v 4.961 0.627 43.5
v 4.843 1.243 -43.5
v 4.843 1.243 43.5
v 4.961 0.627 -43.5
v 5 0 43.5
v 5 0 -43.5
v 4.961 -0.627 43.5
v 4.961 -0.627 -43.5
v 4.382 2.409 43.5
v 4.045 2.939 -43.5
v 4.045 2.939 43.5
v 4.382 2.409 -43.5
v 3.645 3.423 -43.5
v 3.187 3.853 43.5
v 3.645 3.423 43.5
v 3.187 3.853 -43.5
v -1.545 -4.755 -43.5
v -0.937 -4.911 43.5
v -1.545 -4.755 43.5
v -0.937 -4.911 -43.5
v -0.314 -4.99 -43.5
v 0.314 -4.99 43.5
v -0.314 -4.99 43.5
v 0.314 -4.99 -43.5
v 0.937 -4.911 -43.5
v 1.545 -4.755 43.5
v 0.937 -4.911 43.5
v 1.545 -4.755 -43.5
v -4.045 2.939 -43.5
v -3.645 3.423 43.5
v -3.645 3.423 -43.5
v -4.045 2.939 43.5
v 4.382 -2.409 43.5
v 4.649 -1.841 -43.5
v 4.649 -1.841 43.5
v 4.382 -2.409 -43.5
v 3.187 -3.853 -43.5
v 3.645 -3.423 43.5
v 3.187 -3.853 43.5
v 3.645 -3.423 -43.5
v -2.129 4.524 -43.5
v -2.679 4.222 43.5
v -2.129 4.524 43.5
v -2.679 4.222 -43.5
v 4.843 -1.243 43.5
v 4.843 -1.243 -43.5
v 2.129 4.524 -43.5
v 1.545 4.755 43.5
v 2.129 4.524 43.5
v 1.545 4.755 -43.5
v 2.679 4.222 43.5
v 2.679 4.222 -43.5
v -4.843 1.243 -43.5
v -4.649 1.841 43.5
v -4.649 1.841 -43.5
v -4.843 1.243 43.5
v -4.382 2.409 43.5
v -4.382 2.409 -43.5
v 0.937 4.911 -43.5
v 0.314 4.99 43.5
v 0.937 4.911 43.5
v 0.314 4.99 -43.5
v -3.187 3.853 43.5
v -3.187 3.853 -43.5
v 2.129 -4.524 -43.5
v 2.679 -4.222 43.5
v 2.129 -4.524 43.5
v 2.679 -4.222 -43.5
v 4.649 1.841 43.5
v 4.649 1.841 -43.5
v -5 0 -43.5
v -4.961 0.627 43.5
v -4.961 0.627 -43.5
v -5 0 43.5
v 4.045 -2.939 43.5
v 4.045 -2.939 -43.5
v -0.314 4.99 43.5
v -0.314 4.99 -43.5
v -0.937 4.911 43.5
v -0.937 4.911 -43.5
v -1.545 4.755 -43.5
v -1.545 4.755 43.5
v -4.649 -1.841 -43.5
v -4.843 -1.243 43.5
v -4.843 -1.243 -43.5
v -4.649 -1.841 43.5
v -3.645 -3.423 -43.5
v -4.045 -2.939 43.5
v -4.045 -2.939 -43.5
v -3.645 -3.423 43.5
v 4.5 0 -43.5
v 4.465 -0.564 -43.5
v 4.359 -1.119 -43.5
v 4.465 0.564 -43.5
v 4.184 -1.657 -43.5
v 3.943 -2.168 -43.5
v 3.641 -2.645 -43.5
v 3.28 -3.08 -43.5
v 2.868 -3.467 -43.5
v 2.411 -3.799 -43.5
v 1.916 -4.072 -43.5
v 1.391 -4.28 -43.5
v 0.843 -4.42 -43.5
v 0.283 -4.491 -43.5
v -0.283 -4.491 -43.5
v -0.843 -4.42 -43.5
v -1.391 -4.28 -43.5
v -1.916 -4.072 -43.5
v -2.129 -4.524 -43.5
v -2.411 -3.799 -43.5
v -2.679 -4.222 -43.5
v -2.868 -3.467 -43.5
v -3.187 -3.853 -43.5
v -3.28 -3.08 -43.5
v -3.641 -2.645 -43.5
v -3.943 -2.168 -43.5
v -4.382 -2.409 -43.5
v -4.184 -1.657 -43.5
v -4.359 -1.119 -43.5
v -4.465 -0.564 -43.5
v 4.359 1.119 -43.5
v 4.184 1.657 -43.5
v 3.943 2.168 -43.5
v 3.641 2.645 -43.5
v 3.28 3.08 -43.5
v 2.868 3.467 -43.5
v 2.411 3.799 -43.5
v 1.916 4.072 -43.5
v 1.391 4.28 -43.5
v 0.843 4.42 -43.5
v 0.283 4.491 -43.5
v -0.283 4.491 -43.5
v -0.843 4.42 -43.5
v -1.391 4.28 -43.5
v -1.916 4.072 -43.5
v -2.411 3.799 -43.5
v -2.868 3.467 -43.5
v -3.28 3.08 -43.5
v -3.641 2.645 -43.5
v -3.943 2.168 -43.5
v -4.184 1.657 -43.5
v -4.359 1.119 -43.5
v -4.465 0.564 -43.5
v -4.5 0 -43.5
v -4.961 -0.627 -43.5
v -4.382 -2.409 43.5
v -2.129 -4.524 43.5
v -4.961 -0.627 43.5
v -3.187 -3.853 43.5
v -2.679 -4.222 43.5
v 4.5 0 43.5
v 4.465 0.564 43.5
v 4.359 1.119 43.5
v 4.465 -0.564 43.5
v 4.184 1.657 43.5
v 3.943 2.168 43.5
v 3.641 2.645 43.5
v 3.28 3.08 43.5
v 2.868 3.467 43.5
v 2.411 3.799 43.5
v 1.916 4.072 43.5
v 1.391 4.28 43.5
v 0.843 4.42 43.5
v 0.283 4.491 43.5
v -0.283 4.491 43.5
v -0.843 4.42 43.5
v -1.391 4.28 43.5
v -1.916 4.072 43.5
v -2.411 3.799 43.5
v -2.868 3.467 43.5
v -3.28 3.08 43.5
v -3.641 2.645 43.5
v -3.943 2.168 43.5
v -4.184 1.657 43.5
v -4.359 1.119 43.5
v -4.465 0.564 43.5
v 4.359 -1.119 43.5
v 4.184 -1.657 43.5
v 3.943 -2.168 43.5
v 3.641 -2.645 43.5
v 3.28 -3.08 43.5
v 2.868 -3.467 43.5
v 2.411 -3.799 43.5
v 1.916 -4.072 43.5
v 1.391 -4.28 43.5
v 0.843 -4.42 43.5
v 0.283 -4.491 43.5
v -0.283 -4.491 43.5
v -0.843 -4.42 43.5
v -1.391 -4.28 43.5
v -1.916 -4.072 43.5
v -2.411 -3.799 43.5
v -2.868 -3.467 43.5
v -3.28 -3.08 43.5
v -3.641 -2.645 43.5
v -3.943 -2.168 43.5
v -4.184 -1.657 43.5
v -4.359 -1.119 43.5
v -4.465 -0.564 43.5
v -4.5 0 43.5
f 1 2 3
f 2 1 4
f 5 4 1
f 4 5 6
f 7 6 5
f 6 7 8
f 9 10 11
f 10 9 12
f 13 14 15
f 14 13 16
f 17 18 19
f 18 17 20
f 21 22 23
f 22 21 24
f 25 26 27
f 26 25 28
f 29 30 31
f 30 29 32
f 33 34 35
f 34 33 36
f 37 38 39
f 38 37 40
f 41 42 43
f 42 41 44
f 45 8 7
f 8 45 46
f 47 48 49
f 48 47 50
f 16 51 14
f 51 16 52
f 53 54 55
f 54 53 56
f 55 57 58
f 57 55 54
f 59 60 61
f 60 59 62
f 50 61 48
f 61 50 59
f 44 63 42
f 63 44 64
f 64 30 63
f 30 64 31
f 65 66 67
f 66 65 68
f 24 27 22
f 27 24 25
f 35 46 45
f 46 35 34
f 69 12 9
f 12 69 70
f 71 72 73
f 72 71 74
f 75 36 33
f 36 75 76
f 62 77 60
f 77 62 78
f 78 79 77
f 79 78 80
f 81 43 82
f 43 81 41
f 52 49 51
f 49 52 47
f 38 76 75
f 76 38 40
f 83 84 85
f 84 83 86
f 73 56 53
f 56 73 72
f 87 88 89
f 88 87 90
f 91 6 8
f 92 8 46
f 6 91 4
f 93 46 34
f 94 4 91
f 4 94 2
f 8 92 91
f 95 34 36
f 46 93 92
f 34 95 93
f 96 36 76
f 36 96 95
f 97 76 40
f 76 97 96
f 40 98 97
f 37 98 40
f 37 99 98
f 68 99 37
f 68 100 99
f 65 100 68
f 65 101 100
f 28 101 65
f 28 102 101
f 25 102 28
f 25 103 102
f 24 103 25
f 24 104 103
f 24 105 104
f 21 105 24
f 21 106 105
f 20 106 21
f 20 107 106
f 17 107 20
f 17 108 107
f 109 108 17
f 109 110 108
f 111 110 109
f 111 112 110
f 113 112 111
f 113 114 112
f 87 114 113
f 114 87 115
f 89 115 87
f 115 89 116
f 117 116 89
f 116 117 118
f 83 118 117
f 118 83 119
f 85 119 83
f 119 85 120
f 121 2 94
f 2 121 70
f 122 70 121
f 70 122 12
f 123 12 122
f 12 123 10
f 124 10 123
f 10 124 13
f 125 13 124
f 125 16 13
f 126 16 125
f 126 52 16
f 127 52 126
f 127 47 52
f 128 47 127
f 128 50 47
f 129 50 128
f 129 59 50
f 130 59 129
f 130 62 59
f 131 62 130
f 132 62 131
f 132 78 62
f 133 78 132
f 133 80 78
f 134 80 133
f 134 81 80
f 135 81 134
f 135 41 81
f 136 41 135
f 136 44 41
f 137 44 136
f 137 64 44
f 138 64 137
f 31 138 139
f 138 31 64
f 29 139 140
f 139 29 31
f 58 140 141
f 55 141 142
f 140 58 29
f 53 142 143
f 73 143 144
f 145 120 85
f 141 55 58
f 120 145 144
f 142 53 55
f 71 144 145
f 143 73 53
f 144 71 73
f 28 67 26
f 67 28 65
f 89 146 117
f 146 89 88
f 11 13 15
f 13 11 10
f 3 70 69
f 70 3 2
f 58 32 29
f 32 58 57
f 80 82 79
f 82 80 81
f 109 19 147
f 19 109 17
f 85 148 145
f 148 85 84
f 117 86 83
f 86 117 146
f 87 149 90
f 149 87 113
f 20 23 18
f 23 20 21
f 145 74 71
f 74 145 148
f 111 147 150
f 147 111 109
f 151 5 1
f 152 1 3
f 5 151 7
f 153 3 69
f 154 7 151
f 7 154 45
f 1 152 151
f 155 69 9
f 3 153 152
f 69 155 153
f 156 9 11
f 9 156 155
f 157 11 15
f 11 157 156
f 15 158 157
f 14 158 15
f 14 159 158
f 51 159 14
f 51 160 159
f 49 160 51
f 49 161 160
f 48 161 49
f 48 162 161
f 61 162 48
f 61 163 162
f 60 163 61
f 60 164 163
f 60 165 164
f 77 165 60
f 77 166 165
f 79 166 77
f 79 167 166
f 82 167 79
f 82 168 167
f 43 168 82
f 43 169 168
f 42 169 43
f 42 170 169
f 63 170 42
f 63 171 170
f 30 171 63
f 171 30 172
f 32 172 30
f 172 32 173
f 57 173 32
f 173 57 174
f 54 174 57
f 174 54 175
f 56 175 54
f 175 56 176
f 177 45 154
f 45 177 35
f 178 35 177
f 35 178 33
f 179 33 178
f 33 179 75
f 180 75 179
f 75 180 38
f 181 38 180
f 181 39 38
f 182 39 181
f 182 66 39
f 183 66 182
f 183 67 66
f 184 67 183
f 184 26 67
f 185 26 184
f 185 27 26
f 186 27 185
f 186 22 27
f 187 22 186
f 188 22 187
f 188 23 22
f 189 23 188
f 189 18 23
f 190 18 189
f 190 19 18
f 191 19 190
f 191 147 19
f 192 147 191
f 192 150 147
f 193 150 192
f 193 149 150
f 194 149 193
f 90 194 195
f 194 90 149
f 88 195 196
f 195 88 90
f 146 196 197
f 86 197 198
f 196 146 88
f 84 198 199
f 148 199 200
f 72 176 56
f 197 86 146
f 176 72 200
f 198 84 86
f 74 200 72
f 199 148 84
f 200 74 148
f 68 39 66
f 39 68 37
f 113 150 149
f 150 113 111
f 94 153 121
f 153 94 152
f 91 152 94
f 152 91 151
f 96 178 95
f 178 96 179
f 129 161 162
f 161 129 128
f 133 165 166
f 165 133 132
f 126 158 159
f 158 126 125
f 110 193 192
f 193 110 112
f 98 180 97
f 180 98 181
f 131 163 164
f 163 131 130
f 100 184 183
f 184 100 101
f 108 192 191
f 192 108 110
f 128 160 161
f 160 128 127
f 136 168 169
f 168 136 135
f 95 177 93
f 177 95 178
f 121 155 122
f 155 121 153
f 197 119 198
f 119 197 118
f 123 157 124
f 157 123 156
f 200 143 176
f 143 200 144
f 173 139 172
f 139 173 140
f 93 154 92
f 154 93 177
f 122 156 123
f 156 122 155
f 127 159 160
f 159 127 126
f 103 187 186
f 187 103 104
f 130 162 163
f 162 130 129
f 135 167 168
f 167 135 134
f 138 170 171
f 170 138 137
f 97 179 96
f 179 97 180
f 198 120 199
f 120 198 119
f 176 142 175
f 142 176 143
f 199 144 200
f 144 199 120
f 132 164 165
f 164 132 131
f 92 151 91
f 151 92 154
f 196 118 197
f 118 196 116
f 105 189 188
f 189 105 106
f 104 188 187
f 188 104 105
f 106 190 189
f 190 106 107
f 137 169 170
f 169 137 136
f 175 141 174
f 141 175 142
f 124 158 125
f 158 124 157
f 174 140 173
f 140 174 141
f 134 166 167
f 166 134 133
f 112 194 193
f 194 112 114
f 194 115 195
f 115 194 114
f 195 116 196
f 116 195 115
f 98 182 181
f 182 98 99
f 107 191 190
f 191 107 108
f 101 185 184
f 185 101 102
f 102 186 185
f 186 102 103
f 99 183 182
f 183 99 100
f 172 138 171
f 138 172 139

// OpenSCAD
$fn = 50;


difference() {
	union() {
		translate(v = [0, 0, -43.5000000000]) {
			cylinder(h = 87, r = 5.0000000000);
		}
	}
	union() {
		translate(v = [0, 0, -100.0000000000]) {
			cylinder(h = 200, r = 4.5000000000);
		}
	}
}
